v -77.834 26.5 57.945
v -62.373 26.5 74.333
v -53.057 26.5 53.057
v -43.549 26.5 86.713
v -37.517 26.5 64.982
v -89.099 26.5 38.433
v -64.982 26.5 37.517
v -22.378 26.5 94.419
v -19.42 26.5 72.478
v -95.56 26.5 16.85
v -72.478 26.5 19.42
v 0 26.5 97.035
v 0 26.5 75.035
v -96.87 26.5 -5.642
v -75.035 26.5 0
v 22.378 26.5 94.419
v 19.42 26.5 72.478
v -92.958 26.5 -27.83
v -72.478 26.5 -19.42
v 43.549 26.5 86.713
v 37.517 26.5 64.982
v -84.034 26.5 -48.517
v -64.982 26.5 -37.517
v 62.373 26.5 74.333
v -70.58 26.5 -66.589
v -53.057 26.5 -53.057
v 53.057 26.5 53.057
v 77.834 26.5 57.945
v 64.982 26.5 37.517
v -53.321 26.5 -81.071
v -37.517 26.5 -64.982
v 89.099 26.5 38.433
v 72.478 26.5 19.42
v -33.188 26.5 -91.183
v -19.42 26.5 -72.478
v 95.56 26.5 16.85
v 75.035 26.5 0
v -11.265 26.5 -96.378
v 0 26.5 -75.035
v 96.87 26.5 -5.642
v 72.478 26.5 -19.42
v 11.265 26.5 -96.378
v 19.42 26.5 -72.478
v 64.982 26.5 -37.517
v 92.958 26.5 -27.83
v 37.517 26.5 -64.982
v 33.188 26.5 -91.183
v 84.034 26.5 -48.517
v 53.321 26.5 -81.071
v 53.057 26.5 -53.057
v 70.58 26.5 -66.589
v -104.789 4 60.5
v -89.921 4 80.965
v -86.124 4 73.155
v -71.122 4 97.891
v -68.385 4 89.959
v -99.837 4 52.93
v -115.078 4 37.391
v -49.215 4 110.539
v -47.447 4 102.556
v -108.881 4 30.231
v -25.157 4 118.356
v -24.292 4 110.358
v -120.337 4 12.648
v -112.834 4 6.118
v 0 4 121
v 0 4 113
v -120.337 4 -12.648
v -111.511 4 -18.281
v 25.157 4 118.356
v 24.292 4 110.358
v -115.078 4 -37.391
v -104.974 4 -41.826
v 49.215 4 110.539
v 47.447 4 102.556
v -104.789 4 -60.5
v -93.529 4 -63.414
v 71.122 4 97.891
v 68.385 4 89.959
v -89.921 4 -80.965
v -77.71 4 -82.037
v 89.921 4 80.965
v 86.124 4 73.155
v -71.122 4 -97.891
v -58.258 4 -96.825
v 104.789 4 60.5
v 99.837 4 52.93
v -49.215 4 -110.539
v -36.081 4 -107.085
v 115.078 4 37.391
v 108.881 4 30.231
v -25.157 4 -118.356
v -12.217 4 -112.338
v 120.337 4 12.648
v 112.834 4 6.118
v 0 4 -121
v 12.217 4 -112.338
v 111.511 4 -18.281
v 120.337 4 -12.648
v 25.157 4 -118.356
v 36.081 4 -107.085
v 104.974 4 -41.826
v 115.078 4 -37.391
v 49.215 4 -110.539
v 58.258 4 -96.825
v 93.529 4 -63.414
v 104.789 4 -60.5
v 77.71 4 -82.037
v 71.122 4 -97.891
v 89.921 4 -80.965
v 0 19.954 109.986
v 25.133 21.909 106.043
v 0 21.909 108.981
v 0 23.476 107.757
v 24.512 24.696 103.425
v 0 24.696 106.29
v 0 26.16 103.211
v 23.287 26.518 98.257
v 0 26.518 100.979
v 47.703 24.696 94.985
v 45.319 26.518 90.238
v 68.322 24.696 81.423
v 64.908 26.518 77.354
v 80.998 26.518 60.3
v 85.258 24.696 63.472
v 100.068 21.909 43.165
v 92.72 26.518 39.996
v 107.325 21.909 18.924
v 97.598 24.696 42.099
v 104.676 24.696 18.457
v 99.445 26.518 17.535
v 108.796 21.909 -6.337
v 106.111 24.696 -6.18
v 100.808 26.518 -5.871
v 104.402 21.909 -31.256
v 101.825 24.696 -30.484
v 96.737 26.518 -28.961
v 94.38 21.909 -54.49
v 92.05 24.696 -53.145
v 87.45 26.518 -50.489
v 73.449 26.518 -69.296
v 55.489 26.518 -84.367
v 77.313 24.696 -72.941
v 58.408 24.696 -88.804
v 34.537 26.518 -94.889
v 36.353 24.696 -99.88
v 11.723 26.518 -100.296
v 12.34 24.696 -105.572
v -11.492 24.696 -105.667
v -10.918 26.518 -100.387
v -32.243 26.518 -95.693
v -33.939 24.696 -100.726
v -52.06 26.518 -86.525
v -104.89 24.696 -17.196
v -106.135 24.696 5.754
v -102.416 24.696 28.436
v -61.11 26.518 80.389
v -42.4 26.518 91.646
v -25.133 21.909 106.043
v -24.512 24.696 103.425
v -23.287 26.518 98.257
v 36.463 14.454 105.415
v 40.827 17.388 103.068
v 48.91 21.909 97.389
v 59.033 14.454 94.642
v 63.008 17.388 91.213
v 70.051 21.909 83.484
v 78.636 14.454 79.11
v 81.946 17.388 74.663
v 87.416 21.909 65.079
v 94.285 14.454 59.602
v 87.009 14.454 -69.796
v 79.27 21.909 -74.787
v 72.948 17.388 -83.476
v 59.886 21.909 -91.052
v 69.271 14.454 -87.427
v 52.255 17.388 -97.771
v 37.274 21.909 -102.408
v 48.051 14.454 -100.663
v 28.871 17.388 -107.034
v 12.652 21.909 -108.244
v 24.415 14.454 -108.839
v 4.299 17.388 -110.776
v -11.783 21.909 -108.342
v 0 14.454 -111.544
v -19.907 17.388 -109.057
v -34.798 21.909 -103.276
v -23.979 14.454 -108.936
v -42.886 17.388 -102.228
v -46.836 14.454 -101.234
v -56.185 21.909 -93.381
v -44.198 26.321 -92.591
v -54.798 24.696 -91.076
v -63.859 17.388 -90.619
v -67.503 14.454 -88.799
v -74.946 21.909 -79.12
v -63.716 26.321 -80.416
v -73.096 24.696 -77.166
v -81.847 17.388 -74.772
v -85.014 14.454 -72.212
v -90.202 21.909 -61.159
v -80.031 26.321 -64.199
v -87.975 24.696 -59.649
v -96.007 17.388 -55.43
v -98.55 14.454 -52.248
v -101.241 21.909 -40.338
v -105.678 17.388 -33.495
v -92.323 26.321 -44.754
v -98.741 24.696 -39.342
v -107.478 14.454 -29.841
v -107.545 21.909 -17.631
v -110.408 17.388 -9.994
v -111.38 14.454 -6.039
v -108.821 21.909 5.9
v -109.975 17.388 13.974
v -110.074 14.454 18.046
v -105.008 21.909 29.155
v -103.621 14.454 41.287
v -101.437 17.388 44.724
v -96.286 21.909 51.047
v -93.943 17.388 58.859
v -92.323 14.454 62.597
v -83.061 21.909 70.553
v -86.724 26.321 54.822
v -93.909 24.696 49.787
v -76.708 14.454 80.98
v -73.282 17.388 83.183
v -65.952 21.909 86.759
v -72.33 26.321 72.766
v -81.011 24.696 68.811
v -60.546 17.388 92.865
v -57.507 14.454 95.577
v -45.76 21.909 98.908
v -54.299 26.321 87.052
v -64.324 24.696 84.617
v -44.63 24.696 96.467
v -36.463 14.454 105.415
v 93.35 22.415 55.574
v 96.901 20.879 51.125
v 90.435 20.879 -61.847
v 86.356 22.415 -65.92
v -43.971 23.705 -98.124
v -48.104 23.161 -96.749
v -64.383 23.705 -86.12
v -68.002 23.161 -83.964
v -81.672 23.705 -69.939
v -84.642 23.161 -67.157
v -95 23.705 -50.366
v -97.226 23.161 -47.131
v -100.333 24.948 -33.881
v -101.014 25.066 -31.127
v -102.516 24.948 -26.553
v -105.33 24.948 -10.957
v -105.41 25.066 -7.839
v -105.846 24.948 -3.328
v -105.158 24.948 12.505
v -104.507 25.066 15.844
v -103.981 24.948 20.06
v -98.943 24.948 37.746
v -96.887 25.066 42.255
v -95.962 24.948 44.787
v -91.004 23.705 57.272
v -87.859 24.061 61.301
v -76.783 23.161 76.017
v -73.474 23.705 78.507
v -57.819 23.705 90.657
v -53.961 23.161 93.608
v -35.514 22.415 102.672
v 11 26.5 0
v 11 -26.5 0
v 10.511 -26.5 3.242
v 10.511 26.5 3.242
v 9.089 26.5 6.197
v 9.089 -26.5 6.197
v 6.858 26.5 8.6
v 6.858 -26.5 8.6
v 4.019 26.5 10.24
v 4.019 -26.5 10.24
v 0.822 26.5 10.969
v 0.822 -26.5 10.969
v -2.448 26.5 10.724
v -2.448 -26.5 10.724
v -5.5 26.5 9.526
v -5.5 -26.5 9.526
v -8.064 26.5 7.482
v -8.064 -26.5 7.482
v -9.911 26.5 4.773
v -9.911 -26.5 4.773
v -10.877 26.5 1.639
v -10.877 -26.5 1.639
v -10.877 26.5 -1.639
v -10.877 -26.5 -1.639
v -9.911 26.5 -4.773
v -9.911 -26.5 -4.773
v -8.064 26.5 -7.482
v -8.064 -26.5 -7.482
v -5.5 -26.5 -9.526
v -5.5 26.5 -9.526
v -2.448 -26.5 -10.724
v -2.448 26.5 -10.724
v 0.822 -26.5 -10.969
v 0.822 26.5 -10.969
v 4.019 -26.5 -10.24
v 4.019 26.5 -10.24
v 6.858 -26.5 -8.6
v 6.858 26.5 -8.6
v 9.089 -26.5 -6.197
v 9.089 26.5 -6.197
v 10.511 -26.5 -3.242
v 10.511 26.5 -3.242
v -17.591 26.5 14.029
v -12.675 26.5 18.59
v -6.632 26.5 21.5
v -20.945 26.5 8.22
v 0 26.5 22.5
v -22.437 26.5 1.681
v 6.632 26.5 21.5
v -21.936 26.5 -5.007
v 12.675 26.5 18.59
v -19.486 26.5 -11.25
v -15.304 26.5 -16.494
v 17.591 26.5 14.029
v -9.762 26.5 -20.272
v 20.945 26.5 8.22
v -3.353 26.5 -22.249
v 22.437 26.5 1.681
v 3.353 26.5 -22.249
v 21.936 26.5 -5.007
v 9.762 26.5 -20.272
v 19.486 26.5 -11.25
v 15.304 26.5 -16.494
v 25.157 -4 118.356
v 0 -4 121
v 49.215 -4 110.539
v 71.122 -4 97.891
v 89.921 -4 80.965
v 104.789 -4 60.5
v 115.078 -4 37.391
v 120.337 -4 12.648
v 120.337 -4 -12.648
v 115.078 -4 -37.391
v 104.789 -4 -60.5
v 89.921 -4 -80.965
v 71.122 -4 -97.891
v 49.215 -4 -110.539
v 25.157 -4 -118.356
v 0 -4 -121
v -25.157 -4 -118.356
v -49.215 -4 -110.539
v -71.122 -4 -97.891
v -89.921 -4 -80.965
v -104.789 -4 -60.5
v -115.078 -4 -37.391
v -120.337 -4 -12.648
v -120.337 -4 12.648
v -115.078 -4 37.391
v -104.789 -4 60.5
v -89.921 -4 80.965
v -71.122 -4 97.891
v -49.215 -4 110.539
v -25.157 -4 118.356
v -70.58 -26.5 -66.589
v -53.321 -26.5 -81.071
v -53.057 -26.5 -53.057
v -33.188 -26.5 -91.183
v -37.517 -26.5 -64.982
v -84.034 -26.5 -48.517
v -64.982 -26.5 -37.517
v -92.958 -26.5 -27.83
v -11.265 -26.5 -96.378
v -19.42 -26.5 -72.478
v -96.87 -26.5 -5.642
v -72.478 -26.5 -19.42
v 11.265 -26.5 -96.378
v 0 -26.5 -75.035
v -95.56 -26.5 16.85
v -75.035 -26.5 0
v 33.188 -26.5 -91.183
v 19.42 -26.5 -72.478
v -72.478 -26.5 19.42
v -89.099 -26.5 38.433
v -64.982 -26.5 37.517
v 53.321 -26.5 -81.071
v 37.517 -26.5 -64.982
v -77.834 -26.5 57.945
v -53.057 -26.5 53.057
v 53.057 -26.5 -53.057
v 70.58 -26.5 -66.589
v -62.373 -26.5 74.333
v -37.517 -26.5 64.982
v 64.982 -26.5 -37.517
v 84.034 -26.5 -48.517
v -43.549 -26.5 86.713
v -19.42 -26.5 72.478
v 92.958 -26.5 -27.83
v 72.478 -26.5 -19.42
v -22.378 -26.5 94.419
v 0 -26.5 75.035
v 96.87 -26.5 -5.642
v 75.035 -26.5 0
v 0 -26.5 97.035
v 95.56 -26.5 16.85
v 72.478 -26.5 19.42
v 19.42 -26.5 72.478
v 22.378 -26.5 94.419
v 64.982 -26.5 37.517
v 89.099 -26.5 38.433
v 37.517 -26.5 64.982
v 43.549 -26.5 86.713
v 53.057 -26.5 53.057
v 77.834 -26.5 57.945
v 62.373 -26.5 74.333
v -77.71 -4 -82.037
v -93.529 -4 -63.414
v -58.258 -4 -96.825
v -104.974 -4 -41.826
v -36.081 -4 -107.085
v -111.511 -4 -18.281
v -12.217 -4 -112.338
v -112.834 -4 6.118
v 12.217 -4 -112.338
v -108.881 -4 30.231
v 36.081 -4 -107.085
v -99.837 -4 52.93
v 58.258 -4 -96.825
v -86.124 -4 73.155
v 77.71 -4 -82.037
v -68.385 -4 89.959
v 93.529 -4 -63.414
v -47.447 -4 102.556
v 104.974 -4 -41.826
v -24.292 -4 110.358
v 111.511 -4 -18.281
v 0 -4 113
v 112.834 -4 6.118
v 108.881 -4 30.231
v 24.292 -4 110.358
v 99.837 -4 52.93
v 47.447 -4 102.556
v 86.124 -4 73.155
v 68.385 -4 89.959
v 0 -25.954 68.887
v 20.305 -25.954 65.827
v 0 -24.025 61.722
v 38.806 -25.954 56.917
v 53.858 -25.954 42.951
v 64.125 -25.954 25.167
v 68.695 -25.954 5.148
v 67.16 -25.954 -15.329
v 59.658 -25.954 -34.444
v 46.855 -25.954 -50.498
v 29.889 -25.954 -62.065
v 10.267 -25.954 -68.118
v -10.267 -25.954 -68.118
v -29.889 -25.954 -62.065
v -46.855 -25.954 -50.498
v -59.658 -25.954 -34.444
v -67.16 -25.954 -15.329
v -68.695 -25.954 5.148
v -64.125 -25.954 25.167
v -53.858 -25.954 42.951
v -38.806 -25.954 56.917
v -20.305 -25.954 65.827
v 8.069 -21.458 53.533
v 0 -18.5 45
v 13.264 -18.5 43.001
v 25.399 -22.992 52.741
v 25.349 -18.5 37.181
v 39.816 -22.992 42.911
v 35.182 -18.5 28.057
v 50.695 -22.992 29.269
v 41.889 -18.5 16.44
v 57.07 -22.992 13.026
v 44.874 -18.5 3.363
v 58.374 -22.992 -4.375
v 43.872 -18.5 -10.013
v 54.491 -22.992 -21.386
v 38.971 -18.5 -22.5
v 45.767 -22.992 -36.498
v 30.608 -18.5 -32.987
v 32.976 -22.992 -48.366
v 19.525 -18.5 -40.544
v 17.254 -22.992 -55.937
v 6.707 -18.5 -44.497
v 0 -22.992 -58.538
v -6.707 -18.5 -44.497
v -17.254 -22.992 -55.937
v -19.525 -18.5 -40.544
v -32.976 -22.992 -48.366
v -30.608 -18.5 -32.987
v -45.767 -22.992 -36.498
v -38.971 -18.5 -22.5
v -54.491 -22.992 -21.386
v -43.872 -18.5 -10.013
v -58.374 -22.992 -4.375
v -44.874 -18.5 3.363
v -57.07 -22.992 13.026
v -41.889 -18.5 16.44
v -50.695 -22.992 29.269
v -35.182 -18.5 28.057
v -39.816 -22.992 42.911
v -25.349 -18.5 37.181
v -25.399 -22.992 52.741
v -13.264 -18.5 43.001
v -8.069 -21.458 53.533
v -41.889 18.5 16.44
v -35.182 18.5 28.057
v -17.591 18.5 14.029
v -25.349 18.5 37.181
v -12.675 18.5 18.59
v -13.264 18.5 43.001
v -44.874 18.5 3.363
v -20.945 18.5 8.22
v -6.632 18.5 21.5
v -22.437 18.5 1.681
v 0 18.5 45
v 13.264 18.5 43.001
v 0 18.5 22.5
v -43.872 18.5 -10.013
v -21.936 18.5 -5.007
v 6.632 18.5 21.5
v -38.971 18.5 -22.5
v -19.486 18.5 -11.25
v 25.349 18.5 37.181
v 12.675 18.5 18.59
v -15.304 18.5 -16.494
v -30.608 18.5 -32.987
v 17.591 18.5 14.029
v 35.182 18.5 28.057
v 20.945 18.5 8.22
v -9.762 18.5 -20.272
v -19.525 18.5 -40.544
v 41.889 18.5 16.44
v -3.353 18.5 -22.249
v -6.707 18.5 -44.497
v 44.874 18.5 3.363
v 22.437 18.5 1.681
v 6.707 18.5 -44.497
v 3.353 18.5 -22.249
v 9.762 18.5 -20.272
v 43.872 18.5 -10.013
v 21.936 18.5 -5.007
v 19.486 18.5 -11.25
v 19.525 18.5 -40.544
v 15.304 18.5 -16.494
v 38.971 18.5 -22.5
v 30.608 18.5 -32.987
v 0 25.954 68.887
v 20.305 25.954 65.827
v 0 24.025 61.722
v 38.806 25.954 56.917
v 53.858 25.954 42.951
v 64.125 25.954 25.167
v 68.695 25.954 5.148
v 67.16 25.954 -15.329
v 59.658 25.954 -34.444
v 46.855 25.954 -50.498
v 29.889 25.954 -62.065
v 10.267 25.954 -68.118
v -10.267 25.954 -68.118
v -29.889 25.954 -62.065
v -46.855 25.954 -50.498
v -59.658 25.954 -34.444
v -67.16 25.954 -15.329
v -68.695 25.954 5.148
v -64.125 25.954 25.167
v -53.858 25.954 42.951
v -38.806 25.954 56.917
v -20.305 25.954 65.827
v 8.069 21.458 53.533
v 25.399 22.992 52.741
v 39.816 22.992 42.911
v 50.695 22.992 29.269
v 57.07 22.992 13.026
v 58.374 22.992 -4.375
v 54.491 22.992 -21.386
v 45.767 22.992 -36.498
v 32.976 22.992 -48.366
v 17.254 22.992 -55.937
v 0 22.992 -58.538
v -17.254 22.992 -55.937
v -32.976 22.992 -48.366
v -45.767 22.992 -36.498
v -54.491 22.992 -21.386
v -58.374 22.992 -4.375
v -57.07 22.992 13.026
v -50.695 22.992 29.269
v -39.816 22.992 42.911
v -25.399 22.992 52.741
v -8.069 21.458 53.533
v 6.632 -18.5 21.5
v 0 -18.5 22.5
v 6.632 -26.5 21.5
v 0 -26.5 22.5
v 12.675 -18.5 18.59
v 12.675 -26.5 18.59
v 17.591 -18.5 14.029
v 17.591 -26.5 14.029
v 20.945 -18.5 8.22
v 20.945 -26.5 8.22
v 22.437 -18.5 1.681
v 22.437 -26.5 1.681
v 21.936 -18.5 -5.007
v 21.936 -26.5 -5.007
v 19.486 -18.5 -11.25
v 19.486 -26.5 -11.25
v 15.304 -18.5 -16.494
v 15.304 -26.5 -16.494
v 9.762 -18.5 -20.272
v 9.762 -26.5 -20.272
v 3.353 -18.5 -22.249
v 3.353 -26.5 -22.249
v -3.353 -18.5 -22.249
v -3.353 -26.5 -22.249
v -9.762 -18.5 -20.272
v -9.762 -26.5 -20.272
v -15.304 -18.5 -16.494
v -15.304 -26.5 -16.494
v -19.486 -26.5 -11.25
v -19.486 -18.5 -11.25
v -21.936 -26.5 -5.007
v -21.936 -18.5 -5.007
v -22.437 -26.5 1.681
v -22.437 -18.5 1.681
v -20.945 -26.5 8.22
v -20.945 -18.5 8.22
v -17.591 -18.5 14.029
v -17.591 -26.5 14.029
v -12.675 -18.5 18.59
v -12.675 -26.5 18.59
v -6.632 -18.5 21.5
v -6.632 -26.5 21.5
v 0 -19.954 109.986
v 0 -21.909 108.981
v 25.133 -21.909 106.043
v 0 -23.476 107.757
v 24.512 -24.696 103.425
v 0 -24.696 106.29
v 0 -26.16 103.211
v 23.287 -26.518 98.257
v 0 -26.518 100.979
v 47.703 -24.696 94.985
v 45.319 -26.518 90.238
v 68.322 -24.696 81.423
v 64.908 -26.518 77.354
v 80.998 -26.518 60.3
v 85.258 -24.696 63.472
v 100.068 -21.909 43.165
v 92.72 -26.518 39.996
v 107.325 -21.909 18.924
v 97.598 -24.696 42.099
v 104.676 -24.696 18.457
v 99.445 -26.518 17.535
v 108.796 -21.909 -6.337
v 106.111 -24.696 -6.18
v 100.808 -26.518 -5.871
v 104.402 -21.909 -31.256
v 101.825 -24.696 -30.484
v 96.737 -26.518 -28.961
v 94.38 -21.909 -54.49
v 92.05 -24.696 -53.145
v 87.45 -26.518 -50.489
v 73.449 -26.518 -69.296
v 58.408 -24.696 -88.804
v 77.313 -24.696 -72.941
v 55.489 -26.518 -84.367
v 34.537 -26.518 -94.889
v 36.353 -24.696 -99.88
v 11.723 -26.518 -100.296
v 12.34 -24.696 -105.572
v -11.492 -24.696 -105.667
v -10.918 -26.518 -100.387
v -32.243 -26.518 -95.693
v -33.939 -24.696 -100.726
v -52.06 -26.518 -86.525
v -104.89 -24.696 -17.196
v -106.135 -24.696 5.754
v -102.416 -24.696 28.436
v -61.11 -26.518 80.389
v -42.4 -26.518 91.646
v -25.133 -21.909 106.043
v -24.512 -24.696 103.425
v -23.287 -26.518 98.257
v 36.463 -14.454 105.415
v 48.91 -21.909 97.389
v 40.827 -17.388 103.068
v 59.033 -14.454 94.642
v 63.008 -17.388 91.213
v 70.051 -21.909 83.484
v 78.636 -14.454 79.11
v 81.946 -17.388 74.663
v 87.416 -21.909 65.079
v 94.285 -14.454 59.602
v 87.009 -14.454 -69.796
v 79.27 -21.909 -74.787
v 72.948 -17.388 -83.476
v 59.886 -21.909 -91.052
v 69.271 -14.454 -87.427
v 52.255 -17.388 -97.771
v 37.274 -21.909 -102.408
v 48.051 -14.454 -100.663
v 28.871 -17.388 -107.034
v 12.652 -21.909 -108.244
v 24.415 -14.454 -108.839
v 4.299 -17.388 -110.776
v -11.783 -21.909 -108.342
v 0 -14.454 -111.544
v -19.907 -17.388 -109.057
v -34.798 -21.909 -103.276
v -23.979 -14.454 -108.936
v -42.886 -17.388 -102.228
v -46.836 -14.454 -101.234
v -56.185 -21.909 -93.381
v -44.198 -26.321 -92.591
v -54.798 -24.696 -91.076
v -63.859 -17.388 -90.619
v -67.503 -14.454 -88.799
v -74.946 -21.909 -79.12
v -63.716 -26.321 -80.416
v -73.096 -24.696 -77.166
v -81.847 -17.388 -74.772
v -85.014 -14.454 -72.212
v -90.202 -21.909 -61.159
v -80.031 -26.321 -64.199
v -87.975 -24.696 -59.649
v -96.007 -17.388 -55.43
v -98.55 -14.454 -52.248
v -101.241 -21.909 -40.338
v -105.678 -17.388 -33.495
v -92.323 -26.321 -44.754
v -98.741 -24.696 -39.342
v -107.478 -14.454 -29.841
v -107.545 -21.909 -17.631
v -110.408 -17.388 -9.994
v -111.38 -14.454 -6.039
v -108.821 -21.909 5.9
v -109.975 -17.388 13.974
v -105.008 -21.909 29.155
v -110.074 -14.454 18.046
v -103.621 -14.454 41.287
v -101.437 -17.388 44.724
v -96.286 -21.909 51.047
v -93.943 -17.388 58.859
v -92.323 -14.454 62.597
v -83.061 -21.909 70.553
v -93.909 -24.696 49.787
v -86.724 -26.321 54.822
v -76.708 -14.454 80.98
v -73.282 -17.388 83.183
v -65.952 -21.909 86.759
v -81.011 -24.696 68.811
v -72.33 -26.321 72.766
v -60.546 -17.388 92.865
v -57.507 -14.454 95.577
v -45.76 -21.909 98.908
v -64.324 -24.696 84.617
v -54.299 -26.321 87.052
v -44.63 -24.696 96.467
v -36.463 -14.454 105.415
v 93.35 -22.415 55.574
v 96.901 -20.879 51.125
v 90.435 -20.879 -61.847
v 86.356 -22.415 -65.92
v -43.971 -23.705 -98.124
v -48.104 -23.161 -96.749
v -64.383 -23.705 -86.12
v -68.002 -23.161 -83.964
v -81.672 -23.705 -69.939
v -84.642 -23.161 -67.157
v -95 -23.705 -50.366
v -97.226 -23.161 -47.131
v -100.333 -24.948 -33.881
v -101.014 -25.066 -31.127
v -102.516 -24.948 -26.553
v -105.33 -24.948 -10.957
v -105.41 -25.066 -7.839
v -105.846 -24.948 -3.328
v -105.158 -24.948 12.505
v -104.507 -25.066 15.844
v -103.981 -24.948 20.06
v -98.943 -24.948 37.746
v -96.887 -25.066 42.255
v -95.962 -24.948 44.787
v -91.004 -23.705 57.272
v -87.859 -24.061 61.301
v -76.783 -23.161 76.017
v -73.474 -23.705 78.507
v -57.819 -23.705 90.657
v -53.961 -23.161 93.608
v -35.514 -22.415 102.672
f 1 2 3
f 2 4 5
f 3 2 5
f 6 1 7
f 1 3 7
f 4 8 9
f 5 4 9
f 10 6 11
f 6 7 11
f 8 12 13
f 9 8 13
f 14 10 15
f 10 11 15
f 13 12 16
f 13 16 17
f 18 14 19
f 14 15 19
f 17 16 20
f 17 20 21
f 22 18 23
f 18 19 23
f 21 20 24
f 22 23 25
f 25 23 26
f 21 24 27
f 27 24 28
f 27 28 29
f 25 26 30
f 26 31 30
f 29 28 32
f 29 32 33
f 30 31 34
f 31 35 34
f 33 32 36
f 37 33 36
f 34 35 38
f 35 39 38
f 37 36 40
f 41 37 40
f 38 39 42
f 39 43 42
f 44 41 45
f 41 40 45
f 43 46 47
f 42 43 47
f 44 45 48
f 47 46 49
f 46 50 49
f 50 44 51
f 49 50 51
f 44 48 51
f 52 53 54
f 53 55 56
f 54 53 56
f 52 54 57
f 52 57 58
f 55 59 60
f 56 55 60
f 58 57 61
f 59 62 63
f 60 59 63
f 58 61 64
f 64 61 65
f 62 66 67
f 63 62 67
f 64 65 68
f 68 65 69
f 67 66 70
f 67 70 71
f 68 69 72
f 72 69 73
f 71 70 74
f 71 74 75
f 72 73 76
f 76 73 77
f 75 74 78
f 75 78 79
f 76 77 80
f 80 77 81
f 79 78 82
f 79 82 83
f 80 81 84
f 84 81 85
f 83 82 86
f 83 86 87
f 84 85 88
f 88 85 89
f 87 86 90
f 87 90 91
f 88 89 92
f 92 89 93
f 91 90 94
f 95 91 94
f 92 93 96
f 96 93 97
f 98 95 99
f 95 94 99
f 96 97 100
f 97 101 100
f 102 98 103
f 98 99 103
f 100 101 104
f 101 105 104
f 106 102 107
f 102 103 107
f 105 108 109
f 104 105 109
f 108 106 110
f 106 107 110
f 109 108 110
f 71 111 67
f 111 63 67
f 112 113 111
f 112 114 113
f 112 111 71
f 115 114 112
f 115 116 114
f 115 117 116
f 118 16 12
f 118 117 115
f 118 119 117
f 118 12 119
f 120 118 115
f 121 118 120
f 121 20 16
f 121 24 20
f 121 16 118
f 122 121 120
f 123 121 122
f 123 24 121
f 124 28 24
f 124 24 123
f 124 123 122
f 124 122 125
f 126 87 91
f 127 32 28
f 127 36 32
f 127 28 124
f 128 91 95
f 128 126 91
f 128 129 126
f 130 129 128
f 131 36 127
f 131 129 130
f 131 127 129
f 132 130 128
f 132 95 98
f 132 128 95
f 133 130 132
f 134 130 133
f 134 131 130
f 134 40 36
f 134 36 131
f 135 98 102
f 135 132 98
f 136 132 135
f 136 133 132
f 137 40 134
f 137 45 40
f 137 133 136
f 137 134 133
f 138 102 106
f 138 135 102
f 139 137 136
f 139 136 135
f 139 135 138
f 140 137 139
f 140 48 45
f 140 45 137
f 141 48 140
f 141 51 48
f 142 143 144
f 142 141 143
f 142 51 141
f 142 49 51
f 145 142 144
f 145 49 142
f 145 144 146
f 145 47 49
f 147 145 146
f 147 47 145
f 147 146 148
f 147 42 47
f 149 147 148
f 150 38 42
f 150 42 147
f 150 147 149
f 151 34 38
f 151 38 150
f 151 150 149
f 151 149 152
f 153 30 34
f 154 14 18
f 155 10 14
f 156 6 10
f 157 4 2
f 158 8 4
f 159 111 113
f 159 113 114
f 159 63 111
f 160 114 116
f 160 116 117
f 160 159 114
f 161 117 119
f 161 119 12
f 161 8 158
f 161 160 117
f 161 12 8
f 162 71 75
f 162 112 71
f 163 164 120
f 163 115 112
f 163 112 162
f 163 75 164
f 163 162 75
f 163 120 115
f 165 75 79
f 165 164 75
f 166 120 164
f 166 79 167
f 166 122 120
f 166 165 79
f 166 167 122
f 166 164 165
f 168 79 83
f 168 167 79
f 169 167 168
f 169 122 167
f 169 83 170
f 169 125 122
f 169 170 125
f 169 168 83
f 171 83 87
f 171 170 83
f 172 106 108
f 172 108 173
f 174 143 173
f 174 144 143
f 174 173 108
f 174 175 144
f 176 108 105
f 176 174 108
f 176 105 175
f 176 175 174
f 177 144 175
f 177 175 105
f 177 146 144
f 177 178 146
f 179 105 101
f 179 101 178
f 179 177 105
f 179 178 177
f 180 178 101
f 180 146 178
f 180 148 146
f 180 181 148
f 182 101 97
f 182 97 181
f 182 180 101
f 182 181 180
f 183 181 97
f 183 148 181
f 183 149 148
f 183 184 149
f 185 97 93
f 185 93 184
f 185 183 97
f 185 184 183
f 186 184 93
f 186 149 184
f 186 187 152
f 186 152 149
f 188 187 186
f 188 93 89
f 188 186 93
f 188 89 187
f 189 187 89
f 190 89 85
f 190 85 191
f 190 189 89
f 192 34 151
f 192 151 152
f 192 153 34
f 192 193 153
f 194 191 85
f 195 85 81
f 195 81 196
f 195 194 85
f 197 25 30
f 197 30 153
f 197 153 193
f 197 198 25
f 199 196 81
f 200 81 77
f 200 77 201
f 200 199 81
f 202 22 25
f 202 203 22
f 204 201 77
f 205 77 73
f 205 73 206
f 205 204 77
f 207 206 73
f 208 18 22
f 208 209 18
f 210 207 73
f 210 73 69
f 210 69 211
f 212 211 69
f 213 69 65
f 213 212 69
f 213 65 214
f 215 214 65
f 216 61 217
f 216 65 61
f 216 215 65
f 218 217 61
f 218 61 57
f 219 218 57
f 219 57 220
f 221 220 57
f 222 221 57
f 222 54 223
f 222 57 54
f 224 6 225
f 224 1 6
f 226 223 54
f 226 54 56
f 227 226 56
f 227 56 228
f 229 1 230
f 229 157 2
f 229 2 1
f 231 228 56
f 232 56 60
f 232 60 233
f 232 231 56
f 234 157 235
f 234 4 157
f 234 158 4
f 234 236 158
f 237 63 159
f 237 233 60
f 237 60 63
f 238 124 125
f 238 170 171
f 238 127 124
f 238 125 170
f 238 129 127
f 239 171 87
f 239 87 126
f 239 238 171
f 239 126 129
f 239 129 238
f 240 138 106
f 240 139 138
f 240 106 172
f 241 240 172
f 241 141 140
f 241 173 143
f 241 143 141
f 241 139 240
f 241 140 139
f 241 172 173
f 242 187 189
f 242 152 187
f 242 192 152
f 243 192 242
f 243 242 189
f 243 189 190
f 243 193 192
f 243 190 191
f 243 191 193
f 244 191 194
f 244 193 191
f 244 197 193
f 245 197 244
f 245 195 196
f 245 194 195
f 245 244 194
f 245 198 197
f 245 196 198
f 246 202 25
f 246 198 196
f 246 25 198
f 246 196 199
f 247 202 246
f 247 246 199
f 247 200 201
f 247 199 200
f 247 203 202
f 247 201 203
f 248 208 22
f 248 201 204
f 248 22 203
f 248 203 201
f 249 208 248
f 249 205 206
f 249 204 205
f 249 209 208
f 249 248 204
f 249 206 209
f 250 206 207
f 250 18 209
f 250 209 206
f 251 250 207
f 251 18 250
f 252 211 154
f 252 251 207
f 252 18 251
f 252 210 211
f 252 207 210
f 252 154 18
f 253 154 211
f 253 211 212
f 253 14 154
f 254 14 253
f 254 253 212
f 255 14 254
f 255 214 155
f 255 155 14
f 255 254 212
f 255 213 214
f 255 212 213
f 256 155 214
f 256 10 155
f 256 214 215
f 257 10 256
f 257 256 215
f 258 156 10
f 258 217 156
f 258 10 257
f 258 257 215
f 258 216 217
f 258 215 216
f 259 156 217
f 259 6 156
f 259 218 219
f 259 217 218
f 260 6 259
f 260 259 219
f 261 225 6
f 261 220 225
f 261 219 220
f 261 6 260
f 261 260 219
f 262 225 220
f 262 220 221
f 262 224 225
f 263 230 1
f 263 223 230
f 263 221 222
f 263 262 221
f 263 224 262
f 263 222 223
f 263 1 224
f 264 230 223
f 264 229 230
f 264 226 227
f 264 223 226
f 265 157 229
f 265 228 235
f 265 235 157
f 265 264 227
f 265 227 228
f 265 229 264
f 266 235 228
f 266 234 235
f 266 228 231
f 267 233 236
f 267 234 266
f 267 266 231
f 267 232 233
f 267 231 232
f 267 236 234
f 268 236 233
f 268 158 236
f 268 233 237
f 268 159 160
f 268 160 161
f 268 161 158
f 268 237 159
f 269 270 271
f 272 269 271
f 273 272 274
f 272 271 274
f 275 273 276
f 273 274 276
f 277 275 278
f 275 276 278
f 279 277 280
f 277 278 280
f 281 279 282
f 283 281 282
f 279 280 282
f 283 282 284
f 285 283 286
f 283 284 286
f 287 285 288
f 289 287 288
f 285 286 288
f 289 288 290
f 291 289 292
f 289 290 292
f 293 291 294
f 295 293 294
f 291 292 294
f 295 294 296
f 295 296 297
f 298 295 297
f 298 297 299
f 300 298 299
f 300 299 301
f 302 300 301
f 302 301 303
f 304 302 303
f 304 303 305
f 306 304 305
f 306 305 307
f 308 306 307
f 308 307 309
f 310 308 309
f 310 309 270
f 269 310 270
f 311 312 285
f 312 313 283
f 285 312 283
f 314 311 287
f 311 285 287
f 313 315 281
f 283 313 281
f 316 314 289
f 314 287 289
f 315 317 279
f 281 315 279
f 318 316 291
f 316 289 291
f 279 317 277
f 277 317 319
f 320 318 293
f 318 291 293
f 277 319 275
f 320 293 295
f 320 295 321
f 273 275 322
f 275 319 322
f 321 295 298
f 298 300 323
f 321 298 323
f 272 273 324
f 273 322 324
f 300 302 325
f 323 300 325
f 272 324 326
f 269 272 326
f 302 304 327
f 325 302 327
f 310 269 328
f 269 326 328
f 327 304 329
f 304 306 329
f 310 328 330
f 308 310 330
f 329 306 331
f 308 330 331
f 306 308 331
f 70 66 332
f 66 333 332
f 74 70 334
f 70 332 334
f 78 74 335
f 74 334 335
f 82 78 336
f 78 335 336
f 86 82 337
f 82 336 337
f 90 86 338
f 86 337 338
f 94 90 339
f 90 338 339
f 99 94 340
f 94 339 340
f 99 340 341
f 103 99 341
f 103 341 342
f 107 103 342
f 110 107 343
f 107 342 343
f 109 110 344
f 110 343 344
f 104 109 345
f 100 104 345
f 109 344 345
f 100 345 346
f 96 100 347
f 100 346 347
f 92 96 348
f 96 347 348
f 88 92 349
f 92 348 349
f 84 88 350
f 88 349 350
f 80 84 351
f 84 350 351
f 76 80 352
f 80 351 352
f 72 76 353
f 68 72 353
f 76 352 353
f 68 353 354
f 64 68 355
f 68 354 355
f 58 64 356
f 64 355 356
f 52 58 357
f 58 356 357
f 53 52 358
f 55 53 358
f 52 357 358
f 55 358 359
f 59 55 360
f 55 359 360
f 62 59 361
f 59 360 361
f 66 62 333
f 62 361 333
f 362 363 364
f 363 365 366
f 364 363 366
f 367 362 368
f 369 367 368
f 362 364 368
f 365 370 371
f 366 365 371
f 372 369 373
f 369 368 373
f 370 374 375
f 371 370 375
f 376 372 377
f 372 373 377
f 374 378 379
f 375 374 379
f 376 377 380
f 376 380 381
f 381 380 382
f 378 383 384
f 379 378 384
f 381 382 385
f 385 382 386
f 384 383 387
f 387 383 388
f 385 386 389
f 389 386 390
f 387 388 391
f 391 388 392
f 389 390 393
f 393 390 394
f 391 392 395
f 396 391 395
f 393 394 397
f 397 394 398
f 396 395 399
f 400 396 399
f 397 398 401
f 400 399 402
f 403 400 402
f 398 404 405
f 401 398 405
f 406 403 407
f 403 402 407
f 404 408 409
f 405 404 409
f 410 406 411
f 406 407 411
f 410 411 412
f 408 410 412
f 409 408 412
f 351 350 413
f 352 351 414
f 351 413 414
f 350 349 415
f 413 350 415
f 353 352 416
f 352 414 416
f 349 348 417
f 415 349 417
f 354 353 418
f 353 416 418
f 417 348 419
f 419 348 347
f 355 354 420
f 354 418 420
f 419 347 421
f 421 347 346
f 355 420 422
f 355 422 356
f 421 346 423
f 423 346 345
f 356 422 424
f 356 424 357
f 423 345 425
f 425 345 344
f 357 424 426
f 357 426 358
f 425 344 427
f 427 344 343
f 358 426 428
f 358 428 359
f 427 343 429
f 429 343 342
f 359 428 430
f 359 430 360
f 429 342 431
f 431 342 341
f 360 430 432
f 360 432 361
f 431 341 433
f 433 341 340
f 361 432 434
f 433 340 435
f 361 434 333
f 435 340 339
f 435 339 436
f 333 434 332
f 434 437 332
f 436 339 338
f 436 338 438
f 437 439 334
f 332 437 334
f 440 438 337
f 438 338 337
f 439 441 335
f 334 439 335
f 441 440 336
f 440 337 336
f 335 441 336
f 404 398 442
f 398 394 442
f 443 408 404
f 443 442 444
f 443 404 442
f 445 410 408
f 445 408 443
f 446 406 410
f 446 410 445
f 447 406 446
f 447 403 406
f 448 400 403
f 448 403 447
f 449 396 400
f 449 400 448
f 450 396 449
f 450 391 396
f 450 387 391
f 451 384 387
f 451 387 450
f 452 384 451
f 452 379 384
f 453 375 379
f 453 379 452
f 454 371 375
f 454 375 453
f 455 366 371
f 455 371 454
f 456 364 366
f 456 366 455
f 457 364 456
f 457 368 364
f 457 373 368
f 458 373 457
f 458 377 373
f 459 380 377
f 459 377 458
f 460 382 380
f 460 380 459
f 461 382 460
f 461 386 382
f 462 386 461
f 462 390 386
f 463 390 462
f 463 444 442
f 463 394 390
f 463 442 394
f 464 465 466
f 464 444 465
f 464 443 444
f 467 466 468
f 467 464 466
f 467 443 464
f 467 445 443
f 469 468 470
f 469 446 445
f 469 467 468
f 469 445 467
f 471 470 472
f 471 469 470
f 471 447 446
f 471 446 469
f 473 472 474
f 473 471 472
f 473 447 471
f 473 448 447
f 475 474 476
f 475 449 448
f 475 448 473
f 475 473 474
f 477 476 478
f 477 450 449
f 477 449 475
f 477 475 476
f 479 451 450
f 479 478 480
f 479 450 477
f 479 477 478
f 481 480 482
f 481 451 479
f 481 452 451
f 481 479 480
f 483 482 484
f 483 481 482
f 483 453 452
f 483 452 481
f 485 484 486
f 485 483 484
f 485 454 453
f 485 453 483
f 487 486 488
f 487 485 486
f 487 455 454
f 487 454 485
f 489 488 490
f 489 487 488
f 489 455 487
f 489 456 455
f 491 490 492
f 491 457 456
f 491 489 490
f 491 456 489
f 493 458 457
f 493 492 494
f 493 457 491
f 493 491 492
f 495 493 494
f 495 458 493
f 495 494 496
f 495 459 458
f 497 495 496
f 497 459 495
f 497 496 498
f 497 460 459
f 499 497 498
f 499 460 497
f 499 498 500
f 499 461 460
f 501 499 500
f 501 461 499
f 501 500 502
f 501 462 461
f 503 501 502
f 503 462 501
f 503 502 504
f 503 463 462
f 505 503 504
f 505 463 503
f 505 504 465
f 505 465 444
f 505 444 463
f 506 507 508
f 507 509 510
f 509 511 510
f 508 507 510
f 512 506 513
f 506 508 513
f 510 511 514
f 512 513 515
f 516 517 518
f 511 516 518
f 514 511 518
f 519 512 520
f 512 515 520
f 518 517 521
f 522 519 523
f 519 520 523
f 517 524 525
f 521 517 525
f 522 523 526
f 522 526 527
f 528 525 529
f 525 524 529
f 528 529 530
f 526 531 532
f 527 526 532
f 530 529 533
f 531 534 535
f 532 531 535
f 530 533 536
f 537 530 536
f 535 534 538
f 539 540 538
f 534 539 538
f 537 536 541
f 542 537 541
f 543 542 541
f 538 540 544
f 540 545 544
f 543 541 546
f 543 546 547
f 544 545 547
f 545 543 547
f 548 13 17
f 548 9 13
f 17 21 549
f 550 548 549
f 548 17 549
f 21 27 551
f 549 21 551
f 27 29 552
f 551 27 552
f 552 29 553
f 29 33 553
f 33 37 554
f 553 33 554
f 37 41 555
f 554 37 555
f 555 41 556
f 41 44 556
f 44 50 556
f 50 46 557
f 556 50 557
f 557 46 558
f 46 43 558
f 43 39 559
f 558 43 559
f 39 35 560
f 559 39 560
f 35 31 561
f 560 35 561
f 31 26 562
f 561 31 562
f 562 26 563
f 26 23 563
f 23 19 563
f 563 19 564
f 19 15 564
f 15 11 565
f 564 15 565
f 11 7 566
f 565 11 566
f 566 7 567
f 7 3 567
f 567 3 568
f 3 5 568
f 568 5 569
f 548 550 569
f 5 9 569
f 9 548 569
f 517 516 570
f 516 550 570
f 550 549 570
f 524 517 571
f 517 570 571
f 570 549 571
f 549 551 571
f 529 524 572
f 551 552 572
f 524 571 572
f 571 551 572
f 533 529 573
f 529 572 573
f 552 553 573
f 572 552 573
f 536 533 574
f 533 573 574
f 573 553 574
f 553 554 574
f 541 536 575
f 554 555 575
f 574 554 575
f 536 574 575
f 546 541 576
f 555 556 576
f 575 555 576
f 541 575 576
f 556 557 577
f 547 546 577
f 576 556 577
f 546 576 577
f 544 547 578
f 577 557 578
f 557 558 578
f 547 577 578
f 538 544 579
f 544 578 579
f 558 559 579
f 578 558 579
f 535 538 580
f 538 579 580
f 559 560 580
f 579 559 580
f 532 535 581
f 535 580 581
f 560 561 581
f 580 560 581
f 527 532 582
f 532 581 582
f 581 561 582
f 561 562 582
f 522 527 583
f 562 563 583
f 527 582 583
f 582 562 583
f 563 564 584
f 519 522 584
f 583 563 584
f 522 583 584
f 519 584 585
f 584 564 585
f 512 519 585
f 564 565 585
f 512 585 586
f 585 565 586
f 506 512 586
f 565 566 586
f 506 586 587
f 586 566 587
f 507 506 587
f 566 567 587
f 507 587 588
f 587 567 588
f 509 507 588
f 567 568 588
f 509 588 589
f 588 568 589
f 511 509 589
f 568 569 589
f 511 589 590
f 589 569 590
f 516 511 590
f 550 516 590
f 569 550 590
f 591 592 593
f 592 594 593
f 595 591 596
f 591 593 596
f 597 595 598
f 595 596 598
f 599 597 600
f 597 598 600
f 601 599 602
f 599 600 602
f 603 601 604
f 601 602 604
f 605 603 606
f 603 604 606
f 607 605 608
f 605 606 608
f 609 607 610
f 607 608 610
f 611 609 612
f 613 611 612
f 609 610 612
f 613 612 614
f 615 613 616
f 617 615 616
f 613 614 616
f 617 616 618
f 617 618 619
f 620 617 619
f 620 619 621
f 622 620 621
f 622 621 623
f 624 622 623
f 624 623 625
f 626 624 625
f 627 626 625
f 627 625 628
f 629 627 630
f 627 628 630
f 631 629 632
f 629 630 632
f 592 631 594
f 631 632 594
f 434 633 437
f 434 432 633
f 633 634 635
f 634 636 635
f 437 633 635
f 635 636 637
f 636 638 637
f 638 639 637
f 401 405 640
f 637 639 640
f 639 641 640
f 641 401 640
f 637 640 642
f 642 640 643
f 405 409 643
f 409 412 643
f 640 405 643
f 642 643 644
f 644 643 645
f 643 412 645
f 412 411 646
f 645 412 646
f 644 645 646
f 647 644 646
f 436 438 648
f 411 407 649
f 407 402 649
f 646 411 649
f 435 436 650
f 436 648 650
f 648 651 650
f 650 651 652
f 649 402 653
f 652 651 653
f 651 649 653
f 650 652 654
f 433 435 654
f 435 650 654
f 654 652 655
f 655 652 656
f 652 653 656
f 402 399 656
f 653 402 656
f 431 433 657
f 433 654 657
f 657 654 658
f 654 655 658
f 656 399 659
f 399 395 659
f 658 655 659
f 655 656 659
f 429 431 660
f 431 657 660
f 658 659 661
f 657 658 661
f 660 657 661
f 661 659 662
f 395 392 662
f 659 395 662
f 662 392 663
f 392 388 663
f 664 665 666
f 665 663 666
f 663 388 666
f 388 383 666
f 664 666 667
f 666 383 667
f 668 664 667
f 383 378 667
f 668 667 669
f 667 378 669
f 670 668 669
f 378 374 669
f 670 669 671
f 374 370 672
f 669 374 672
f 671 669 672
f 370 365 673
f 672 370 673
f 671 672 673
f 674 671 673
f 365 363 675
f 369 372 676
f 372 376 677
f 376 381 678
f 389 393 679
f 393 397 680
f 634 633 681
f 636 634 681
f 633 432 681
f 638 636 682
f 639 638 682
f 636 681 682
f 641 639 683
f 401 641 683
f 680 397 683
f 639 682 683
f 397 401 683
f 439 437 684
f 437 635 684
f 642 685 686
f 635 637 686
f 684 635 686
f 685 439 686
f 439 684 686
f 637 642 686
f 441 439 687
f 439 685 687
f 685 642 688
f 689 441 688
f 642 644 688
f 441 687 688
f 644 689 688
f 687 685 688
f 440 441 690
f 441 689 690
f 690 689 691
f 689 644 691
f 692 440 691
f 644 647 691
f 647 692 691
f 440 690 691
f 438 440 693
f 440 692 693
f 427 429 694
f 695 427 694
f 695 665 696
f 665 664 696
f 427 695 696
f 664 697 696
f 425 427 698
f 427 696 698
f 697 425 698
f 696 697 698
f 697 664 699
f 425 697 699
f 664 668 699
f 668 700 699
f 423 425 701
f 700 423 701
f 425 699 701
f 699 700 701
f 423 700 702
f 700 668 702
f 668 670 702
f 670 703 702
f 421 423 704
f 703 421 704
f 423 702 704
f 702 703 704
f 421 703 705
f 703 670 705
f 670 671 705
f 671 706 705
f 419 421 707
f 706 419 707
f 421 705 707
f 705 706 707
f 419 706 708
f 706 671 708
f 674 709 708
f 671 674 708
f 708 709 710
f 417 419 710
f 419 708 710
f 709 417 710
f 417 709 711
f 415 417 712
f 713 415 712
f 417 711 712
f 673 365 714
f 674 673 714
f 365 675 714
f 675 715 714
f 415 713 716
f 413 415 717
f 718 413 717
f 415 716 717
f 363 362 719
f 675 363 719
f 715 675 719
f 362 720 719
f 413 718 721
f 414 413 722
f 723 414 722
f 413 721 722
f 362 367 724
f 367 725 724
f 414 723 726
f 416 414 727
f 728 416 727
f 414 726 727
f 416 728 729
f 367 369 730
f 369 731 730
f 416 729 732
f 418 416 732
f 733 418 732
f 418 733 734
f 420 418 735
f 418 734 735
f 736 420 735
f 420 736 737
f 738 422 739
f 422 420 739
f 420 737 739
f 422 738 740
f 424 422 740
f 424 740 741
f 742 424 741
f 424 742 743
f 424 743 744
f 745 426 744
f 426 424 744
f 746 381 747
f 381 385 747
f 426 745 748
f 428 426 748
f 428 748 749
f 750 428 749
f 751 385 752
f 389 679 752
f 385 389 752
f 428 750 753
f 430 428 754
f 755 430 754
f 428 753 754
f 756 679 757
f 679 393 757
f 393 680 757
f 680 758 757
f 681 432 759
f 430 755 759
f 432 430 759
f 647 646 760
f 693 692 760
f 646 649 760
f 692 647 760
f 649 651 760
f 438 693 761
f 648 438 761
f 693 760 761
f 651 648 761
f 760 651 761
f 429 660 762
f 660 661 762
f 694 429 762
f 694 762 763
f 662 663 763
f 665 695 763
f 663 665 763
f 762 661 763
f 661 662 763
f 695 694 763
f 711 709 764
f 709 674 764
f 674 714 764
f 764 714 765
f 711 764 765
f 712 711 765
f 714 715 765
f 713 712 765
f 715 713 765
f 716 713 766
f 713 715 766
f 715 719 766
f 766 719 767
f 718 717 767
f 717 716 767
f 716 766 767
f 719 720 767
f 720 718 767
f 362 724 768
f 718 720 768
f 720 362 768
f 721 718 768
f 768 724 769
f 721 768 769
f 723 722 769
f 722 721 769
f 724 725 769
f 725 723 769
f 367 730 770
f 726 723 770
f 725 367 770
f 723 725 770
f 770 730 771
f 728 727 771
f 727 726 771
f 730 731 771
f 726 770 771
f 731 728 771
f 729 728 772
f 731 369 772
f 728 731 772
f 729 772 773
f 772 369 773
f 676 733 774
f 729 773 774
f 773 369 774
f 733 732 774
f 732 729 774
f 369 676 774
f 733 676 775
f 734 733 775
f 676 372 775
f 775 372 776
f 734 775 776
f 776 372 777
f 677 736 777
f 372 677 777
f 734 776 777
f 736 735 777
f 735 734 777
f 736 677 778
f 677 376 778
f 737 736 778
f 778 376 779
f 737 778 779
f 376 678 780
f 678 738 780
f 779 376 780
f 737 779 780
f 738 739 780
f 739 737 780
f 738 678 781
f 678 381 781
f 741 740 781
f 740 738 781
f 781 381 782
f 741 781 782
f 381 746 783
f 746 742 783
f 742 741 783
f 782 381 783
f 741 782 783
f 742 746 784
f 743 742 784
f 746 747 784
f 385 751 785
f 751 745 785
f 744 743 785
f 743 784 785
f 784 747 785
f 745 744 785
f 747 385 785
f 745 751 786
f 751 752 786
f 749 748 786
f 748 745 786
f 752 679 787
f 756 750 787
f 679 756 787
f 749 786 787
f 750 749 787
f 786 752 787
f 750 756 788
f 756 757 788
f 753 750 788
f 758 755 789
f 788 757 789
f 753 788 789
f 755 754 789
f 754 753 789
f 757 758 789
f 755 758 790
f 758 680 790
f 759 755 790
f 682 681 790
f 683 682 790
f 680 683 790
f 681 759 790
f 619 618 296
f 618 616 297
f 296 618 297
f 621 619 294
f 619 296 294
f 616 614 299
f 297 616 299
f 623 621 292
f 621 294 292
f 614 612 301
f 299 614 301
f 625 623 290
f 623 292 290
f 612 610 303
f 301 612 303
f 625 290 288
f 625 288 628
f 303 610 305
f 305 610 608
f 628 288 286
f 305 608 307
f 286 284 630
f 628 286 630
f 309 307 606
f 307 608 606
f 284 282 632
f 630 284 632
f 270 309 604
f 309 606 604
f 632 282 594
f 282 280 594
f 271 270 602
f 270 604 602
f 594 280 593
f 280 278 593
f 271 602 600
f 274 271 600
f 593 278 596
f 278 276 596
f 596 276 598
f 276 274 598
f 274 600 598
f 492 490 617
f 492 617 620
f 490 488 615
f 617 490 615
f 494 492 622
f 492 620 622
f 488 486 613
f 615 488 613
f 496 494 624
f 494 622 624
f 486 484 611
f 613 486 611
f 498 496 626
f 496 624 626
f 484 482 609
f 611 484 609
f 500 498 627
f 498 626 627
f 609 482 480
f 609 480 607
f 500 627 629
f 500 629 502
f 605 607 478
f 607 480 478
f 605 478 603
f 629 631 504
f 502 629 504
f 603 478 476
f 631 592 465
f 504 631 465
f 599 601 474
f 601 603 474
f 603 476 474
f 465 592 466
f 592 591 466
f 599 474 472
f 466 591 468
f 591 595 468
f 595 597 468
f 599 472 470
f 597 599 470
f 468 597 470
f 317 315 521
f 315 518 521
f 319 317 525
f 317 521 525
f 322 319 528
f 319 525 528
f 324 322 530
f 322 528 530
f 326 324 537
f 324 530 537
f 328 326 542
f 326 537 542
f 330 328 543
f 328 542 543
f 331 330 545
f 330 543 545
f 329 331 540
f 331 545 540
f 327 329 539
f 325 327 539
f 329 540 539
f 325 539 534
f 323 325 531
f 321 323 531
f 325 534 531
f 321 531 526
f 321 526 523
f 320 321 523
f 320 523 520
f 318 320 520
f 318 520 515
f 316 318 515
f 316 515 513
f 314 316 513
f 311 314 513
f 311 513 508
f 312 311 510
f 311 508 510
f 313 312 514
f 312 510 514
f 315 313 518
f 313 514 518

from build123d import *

# Parameters (mm, degrees)
F2_R     = 11
F3_DEPTH = 53.0453037885


with BuildPart() as f1:
    # F0 (on Right) → F1 (revolve)
    with BuildSketch(Plane.YZ):
        with BuildLine():
            Line((-26.5, 0), (0, 0))
            Line((0, 0), (26.5, 0))
            Line((26.5, 0), (26.5, 22.5))
            Line((26.5, 22.5), (18.5, 22.5))
            Line((18.5, 22.5), (18.5, 45))
            add(Edge.make_bspline(
                [(18.5, 45), (19.5294032027, 48.9127575131), (22.161666724, 55.8894054865), (24.4873005161, 63.090857729), (26.1477720941, 68.9369086166), (26.4605557105, 72.6163447861), (26.5, 75.0345438719)],
                knots=[0, 0, 0, 0, 0.3090965399, 0.5575720867, 0.7747005836, 1, 1, 1, 1], degree=3))
            Line((26.5, 75.0345438719), (26.5, 97.0345438719))
            add(Edge.make_bspline(
                [(4, 113), (9.3687376029, 112.4098545459), (18.1441221183, 111.3277676815), (24.0944618424, 107.8956142299), (26.5461108875, 102.9075068186), (26.5959951506, 100.8855119386), (26.5, 97.0345438719)],
                knots=[0, 0, 0, 0, 0.3471593385, 0.577462282, 0.7693182742, 1, 1, 1, 1], degree=3))
            Line((4, 113), (4, 121))
            Line((4, 121), (0, 121))
            Line((0, 121), (-4, 121))
            Line((-4, 121), (-4, 113))
            add(Edge.make_bspline(
                [(-4, 113), (-9.3687376029, 112.4098545459), (-18.1441221183, 111.3277676815), (-24.0944618424, 107.8956142299), (-26.5461108875, 102.9075068186), (-26.5959951506, 100.8855119386), (-26.5, 97.0345438719)],
                knots=[0, 0, 0, 0, 0.3471593385, 0.577462282, 0.7693182742, 1, 1, 1, 1], degree=3))
            Line((-26.5, 97.0345438719), (-26.5, 75.0345438719))
            add(Edge.make_bspline(
                [(-18.5, 45), (-19.5294032027, 48.9127575131), (-22.161666724, 55.8894054865), (-24.4873005161, 63.090857729), (-26.1477720941, 68.9369086166), (-26.4605557105, 72.6163447861), (-26.5, 75.0345438719)],
                knots=[0, 0, 0, 0, 0.3090965399, 0.5575720867, 0.7747005836, 1, 1, 1, 1], degree=3))
            Line((-18.5, 45), (-18.5, 22.5))
            Line((-18.5, 22.5), (-26.5, 22.5))
            Line((-26.5, 22.5), (-26.5, 0))
        make_face()
    revolve(axis=Axis((0, 13.25, 0), (0, 1, 0)))

    # F2 (on face) → F3 (cut, through all)
    with BuildSketch(Plane.XZ.offset(26.5)):
        Circle(F2_R)
    extrude(amount=-F3_DEPTH, mode=Mode.SUBTRACT)


solid = f1.part
